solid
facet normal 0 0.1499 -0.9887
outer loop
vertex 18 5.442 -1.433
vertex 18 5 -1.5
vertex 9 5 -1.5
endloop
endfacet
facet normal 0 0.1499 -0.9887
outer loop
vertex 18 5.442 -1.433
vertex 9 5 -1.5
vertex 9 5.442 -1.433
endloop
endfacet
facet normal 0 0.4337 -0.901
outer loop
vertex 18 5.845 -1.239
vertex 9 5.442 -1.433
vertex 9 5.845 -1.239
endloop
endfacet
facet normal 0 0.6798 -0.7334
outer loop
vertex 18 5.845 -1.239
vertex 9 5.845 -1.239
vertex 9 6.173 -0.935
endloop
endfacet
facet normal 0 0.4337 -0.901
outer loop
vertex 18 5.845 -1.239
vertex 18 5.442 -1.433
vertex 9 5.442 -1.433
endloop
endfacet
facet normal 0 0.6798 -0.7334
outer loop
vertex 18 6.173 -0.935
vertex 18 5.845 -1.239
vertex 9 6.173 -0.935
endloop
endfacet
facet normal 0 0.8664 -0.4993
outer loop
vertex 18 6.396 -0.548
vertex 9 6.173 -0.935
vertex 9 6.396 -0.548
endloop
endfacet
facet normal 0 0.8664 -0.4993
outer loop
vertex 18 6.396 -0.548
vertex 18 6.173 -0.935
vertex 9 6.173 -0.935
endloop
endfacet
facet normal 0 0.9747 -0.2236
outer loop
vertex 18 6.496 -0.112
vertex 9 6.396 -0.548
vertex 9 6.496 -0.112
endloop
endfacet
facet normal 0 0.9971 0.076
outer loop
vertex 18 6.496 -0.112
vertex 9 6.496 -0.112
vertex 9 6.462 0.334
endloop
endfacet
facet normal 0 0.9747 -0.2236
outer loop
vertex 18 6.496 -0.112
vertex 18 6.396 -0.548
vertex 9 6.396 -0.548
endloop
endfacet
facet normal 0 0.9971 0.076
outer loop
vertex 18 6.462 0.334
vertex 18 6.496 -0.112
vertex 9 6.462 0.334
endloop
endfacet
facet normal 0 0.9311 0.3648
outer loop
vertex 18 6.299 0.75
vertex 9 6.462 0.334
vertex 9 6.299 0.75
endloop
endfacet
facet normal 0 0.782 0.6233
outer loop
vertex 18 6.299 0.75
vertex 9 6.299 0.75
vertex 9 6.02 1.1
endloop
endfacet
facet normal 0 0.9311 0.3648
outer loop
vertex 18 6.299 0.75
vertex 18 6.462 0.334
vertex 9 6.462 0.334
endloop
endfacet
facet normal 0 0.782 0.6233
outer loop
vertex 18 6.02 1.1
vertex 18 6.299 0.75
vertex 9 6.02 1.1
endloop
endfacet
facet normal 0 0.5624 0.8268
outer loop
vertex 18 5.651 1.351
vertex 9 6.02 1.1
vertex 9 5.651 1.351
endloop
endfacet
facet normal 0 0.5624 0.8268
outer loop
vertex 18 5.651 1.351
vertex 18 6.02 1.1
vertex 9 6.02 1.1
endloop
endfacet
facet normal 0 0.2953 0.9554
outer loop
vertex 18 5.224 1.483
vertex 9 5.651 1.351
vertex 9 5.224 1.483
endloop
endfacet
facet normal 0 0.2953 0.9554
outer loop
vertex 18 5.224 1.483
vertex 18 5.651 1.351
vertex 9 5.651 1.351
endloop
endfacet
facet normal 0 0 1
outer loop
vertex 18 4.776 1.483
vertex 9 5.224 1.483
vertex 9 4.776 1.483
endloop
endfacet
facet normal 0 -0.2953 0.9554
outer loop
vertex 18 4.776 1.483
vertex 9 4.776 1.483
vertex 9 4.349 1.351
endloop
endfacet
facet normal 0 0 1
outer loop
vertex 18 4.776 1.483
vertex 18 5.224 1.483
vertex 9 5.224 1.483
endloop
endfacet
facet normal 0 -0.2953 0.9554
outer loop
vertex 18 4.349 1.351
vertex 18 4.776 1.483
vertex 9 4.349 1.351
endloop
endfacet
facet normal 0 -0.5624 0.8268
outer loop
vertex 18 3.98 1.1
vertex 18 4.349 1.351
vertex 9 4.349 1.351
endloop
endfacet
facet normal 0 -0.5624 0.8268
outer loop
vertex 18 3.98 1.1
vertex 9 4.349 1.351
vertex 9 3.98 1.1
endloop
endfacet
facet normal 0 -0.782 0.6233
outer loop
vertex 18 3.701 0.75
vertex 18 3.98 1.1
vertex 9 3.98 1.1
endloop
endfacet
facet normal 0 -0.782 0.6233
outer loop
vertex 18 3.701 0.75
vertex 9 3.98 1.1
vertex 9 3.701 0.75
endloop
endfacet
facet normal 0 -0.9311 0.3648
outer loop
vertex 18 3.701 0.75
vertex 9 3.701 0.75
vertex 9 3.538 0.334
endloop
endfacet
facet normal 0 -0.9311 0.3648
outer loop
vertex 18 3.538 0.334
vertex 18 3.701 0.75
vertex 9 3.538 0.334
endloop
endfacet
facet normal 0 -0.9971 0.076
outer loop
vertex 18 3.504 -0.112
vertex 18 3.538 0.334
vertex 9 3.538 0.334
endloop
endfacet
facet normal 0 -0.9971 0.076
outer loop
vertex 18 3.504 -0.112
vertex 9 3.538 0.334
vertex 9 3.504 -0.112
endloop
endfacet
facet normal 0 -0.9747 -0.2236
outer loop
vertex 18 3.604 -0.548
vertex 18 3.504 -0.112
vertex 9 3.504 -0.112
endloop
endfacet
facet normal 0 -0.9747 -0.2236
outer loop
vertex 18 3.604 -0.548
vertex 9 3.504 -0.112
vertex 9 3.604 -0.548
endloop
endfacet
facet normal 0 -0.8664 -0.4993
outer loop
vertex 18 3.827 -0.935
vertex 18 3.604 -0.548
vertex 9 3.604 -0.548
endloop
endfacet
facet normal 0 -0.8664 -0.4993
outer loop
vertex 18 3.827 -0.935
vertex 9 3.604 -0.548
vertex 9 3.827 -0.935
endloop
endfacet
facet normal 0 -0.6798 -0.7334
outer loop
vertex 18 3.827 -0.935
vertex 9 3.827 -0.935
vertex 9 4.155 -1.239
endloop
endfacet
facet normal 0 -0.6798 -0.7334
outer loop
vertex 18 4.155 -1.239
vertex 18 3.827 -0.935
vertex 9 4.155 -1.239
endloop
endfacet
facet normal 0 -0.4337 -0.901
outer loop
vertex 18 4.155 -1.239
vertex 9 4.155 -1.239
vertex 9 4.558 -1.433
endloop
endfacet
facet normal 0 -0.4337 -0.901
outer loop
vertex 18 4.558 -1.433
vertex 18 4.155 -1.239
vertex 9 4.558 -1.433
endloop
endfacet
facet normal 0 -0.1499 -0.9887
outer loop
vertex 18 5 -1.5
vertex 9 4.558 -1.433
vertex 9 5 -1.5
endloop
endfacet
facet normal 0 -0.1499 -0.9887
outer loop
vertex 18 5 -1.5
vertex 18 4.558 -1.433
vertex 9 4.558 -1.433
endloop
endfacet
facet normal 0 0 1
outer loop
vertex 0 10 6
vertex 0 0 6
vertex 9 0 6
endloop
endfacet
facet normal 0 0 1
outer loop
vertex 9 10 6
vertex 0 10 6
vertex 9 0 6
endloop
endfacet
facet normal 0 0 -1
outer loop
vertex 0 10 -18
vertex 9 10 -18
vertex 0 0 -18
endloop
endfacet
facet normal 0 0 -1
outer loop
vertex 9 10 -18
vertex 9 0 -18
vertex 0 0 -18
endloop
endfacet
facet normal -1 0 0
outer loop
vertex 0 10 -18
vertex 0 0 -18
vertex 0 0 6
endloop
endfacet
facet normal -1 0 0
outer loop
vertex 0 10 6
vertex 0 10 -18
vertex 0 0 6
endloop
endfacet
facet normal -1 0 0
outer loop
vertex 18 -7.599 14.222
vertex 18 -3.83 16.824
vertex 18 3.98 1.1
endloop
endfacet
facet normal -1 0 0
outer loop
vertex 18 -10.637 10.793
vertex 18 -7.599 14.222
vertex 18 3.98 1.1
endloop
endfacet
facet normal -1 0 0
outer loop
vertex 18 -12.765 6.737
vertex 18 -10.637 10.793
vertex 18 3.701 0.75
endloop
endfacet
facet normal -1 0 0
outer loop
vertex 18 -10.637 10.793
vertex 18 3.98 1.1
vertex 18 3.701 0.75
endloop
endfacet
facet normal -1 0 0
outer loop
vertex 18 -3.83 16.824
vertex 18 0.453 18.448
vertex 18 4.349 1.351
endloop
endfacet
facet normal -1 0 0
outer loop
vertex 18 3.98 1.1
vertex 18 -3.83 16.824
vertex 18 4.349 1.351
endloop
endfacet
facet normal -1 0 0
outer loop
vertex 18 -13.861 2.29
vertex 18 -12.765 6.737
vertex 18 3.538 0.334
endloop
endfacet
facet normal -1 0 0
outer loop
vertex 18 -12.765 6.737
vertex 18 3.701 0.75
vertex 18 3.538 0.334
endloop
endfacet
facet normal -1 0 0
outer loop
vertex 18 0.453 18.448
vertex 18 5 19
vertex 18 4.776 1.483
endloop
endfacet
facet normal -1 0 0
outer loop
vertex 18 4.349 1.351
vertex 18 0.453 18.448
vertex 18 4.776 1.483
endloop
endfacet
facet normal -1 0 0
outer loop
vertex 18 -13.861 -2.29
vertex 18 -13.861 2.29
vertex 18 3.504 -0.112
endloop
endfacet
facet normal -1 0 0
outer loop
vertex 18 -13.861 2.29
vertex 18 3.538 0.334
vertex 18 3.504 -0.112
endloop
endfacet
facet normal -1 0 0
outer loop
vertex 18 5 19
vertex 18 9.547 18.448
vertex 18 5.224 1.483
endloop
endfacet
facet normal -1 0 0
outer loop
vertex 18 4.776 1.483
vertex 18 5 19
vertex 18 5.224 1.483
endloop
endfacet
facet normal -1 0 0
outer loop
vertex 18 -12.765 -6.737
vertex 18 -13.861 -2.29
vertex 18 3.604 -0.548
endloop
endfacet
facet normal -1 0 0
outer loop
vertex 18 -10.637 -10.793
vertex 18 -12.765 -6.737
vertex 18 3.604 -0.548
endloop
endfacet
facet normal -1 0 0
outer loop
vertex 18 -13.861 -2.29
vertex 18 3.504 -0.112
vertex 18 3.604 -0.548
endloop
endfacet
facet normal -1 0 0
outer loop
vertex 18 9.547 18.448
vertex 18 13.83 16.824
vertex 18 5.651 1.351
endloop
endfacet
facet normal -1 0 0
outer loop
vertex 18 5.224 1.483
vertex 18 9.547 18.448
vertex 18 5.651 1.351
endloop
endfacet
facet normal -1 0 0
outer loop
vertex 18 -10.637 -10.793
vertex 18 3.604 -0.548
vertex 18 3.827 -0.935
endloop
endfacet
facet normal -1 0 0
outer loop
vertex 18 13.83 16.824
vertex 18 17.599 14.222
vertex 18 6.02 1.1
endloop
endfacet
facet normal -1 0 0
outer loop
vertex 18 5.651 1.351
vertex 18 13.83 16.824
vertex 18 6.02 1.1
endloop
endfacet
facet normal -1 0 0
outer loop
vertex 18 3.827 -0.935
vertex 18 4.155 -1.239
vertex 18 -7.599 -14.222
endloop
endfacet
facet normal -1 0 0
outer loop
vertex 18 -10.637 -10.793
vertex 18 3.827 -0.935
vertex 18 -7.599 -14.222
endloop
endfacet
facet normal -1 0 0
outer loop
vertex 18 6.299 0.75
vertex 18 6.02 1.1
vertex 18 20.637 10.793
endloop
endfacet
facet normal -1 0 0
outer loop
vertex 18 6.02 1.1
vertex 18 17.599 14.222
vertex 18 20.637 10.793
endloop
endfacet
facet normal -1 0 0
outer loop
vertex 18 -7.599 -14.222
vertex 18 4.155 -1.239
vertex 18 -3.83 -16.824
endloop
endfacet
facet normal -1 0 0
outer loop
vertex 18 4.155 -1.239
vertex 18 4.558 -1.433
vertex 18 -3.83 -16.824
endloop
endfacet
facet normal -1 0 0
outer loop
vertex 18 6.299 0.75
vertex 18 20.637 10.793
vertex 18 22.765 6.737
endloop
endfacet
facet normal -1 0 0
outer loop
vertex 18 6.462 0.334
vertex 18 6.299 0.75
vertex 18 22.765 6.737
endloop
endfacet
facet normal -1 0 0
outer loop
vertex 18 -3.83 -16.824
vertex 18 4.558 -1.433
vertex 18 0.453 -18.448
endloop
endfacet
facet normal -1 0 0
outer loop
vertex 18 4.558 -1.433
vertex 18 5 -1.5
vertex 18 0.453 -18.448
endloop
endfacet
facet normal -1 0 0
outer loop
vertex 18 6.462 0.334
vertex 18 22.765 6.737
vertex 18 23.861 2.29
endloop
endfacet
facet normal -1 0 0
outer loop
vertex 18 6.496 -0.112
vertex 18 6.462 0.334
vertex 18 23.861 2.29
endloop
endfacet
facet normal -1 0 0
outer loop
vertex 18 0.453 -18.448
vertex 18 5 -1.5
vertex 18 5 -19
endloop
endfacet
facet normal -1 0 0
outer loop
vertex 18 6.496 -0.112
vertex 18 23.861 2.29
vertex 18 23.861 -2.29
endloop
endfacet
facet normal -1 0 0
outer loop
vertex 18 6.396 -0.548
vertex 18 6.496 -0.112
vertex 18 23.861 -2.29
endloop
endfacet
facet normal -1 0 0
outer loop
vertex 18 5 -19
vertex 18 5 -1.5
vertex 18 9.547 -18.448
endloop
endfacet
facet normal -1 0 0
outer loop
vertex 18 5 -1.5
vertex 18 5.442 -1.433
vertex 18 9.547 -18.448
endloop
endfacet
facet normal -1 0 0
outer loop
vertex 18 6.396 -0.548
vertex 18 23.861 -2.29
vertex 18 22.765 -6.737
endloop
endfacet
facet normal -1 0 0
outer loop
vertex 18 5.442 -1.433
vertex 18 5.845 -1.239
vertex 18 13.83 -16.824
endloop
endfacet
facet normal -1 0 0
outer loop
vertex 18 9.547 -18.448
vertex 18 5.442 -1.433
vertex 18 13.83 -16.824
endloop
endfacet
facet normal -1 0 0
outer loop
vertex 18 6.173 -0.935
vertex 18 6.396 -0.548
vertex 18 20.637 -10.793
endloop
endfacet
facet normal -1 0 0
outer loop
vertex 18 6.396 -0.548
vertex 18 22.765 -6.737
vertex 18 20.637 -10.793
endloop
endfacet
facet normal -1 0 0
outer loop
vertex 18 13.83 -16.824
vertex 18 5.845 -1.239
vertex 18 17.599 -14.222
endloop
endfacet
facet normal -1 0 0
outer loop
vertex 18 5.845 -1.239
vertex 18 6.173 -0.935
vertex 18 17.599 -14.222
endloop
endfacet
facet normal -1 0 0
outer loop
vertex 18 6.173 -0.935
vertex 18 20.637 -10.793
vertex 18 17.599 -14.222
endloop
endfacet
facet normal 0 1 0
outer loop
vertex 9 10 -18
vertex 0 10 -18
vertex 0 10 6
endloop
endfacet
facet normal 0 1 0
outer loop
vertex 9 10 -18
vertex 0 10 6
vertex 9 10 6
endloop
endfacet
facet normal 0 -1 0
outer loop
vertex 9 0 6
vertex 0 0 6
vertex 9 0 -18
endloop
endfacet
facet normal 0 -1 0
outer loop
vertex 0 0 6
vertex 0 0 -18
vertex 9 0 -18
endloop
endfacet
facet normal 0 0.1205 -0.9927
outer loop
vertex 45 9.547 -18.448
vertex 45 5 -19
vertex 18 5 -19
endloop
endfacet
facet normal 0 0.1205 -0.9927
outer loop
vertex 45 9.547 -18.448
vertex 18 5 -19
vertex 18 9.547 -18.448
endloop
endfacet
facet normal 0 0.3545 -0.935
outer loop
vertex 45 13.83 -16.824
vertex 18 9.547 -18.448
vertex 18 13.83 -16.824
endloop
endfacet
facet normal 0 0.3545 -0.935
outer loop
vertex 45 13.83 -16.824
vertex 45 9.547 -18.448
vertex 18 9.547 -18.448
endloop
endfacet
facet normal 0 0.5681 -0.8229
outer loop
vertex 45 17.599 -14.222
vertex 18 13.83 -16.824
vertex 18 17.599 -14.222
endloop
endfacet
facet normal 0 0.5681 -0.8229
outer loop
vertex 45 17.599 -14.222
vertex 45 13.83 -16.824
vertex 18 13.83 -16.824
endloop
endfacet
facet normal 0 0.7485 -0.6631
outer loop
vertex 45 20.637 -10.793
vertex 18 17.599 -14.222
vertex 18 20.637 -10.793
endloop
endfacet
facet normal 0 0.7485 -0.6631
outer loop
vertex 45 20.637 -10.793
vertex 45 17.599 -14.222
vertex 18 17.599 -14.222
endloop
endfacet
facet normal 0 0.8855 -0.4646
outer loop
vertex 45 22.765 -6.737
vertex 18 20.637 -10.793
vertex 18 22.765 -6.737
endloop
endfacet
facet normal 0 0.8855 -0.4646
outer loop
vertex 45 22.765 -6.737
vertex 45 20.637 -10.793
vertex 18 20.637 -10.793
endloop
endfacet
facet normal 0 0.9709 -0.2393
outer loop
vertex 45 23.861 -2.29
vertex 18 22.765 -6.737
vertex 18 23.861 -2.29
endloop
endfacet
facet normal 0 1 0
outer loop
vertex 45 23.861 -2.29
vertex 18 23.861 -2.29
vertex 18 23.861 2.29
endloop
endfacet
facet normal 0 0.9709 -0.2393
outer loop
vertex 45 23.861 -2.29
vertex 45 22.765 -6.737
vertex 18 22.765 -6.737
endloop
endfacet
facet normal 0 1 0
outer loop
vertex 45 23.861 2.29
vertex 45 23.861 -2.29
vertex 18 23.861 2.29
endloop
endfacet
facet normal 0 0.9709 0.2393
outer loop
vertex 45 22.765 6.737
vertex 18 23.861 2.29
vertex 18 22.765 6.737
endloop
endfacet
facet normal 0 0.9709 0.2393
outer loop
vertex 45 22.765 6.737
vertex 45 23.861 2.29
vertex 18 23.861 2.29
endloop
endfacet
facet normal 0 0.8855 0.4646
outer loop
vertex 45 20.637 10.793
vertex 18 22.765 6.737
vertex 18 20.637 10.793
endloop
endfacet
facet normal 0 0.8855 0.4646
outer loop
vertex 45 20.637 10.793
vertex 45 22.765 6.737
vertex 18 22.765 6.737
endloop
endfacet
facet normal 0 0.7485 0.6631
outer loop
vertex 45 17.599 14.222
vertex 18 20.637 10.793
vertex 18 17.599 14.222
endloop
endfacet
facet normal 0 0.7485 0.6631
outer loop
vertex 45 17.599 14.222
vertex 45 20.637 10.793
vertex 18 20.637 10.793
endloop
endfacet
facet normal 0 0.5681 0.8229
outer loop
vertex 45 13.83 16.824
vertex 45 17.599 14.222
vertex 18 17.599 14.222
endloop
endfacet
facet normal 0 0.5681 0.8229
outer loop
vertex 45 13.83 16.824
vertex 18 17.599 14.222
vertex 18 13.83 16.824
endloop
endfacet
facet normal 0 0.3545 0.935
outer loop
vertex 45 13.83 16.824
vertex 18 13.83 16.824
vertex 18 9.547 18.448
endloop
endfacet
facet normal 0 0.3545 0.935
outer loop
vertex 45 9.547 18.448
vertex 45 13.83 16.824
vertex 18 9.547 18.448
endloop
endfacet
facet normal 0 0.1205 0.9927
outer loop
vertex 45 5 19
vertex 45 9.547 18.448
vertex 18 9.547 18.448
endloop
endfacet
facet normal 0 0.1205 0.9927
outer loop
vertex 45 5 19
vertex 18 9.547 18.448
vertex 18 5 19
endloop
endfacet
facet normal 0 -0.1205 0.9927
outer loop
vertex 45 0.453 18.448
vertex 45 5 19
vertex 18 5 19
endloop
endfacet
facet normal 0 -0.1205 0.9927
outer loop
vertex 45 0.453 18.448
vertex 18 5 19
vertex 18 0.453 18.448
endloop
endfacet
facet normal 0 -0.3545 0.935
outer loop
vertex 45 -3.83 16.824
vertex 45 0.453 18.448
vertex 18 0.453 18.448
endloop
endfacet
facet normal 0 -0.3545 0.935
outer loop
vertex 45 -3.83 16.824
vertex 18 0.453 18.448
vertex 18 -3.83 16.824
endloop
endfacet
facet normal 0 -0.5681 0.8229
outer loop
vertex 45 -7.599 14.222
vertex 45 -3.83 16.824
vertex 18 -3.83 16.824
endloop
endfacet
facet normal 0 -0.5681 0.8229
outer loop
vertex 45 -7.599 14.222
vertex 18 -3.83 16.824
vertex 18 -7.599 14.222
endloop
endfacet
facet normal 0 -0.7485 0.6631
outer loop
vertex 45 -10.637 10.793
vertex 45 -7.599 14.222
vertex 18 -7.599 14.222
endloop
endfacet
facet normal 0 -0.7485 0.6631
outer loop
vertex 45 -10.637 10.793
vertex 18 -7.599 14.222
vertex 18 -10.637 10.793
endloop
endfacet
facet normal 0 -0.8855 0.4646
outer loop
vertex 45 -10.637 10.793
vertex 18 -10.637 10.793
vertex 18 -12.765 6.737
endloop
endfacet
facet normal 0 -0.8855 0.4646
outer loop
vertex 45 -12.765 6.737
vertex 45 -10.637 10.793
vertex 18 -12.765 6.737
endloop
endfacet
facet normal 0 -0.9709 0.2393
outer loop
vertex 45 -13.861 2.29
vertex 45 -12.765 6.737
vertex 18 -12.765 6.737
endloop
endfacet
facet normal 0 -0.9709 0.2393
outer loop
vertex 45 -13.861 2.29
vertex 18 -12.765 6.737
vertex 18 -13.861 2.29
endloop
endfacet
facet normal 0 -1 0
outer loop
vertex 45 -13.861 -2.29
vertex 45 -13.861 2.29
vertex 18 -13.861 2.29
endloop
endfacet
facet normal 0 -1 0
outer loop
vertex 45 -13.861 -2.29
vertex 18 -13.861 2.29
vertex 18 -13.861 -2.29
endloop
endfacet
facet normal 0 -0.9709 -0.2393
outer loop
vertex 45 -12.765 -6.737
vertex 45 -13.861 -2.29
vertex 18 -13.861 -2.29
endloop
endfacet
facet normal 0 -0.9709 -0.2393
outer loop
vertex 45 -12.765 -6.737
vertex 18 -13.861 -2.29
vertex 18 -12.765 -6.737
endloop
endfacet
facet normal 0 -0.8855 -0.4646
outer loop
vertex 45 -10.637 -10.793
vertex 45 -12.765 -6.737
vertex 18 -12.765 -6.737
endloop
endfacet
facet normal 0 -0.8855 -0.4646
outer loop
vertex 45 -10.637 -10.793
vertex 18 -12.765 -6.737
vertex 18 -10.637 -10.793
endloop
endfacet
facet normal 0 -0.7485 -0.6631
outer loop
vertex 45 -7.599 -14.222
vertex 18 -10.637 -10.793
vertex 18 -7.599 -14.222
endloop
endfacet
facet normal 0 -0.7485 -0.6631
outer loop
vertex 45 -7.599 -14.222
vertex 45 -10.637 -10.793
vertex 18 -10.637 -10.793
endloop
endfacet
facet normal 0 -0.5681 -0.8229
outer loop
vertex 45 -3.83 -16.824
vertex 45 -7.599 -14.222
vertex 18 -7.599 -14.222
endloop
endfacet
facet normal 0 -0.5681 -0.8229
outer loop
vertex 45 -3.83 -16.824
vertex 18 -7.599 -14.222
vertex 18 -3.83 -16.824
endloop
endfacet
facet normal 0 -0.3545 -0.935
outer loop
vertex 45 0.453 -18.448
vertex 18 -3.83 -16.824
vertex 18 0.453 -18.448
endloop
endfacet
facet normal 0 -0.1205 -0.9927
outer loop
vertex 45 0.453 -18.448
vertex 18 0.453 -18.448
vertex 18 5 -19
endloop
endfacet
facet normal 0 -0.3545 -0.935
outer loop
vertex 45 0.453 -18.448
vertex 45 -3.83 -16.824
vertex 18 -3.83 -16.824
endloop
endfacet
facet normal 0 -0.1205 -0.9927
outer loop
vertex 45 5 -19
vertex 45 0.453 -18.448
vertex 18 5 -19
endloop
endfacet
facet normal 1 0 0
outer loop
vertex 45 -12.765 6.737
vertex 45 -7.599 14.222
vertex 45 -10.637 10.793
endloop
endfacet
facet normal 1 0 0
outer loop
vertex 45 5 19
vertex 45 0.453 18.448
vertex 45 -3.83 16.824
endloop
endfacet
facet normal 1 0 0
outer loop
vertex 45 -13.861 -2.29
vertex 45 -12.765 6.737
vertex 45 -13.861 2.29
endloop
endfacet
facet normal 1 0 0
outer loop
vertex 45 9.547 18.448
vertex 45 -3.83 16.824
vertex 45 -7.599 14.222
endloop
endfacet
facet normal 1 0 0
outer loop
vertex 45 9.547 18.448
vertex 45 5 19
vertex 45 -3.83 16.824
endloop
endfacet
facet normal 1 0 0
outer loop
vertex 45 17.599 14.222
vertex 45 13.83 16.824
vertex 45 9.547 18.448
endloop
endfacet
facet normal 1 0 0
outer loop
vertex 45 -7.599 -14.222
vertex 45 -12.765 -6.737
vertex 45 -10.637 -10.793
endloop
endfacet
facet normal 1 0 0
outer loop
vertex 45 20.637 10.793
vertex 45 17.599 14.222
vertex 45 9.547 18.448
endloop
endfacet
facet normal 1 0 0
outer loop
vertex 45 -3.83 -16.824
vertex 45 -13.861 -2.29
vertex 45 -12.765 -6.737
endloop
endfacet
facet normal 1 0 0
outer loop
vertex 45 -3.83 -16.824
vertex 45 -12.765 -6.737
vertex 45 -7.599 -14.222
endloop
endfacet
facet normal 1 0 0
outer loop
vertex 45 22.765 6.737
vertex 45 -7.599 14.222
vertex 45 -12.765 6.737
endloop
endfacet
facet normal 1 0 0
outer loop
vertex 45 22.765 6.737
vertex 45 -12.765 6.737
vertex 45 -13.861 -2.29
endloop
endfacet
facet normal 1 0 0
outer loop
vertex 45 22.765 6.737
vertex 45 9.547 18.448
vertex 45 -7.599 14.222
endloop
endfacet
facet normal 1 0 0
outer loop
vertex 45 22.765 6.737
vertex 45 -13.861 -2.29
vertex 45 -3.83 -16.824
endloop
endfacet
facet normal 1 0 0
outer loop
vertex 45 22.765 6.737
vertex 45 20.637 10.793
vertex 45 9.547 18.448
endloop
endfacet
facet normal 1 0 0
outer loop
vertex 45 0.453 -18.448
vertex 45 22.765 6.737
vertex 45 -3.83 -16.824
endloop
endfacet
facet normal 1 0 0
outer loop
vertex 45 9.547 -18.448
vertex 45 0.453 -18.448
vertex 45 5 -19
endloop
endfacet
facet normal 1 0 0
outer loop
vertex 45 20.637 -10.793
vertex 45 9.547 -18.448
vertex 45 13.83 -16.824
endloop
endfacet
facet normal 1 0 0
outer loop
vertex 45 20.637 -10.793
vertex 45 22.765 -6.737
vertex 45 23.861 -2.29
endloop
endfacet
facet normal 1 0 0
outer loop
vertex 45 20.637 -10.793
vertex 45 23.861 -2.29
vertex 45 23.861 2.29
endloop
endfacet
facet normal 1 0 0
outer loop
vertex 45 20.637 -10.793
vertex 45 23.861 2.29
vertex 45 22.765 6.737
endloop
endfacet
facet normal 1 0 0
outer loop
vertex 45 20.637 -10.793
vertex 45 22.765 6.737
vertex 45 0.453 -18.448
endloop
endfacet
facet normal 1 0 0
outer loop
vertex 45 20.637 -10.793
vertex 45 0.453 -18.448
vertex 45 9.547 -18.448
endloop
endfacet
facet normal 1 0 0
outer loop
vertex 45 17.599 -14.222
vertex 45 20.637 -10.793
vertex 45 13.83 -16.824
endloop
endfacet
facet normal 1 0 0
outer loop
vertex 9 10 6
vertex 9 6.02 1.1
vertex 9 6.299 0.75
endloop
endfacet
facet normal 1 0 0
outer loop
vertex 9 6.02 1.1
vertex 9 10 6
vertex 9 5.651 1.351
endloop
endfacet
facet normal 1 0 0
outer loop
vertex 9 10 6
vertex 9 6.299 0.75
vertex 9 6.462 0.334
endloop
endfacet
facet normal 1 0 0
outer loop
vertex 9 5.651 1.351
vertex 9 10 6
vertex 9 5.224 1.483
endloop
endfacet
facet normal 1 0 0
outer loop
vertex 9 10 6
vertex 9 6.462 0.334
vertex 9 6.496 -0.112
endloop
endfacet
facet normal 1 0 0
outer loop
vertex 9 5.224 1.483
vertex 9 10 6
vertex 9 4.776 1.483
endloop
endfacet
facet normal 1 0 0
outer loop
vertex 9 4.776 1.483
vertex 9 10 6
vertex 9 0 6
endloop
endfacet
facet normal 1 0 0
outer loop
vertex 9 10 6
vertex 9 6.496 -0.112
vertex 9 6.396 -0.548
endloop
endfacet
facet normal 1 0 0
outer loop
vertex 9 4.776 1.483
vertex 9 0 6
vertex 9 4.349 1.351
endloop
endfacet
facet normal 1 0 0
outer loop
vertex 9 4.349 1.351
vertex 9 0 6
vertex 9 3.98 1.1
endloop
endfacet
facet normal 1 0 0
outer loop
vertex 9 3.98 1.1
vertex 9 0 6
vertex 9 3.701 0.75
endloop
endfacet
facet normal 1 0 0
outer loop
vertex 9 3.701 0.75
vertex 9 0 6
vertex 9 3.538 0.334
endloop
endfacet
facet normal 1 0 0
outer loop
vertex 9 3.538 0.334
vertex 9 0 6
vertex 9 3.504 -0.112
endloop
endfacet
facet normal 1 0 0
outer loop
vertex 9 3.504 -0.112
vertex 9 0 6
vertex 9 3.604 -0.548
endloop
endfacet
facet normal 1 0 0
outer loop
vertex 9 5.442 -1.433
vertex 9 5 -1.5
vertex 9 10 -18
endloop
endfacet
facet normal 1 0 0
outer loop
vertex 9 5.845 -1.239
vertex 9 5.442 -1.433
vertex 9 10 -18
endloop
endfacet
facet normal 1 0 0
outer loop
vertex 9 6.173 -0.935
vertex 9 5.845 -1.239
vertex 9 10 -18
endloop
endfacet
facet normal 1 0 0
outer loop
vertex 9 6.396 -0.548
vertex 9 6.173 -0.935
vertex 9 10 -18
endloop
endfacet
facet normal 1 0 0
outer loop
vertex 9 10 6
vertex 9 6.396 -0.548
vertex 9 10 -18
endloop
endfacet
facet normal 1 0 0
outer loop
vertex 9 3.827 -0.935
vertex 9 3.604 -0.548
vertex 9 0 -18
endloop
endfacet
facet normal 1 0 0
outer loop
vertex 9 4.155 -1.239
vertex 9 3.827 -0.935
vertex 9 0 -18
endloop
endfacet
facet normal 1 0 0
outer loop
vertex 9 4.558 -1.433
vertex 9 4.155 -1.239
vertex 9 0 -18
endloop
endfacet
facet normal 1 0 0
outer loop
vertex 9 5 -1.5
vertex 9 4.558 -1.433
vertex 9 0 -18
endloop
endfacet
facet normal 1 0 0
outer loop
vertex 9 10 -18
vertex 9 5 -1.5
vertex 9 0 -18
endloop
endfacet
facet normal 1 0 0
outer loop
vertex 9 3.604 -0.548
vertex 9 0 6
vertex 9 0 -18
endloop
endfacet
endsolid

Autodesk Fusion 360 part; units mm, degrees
sketch "草图1" plane through (0, 0, 0) normal (0, 1, 0) x (1, 0, 0)
  line L0 (0, -6) -> (9, -6)
  line L1 (9, -6) -> (9, 18)
  line L2 (9, 18) -> (0, 18)
  line L3 (0, 18) -> (0, -6)
extrude "拉伸1" add sketch "草图1" along normal blind 5 and the other way blind 0
extrude "拉伸2" add 1 faces at (3, 5, -10) along direction (0, 1, 0) blind 5
cylinder "圆柱体基本要素1" add diameter 3 height 9 placed x (0, 0, -1) y (0, 1, 0) z (1, 0, 0) at (9, 5, 0)
cylinder "圆柱体基本要素2" add diameter 38 height 27 placed x (0, 0, -1) y (0, 1, 0) z (1, 0, 0) at (18, 5, 0)
